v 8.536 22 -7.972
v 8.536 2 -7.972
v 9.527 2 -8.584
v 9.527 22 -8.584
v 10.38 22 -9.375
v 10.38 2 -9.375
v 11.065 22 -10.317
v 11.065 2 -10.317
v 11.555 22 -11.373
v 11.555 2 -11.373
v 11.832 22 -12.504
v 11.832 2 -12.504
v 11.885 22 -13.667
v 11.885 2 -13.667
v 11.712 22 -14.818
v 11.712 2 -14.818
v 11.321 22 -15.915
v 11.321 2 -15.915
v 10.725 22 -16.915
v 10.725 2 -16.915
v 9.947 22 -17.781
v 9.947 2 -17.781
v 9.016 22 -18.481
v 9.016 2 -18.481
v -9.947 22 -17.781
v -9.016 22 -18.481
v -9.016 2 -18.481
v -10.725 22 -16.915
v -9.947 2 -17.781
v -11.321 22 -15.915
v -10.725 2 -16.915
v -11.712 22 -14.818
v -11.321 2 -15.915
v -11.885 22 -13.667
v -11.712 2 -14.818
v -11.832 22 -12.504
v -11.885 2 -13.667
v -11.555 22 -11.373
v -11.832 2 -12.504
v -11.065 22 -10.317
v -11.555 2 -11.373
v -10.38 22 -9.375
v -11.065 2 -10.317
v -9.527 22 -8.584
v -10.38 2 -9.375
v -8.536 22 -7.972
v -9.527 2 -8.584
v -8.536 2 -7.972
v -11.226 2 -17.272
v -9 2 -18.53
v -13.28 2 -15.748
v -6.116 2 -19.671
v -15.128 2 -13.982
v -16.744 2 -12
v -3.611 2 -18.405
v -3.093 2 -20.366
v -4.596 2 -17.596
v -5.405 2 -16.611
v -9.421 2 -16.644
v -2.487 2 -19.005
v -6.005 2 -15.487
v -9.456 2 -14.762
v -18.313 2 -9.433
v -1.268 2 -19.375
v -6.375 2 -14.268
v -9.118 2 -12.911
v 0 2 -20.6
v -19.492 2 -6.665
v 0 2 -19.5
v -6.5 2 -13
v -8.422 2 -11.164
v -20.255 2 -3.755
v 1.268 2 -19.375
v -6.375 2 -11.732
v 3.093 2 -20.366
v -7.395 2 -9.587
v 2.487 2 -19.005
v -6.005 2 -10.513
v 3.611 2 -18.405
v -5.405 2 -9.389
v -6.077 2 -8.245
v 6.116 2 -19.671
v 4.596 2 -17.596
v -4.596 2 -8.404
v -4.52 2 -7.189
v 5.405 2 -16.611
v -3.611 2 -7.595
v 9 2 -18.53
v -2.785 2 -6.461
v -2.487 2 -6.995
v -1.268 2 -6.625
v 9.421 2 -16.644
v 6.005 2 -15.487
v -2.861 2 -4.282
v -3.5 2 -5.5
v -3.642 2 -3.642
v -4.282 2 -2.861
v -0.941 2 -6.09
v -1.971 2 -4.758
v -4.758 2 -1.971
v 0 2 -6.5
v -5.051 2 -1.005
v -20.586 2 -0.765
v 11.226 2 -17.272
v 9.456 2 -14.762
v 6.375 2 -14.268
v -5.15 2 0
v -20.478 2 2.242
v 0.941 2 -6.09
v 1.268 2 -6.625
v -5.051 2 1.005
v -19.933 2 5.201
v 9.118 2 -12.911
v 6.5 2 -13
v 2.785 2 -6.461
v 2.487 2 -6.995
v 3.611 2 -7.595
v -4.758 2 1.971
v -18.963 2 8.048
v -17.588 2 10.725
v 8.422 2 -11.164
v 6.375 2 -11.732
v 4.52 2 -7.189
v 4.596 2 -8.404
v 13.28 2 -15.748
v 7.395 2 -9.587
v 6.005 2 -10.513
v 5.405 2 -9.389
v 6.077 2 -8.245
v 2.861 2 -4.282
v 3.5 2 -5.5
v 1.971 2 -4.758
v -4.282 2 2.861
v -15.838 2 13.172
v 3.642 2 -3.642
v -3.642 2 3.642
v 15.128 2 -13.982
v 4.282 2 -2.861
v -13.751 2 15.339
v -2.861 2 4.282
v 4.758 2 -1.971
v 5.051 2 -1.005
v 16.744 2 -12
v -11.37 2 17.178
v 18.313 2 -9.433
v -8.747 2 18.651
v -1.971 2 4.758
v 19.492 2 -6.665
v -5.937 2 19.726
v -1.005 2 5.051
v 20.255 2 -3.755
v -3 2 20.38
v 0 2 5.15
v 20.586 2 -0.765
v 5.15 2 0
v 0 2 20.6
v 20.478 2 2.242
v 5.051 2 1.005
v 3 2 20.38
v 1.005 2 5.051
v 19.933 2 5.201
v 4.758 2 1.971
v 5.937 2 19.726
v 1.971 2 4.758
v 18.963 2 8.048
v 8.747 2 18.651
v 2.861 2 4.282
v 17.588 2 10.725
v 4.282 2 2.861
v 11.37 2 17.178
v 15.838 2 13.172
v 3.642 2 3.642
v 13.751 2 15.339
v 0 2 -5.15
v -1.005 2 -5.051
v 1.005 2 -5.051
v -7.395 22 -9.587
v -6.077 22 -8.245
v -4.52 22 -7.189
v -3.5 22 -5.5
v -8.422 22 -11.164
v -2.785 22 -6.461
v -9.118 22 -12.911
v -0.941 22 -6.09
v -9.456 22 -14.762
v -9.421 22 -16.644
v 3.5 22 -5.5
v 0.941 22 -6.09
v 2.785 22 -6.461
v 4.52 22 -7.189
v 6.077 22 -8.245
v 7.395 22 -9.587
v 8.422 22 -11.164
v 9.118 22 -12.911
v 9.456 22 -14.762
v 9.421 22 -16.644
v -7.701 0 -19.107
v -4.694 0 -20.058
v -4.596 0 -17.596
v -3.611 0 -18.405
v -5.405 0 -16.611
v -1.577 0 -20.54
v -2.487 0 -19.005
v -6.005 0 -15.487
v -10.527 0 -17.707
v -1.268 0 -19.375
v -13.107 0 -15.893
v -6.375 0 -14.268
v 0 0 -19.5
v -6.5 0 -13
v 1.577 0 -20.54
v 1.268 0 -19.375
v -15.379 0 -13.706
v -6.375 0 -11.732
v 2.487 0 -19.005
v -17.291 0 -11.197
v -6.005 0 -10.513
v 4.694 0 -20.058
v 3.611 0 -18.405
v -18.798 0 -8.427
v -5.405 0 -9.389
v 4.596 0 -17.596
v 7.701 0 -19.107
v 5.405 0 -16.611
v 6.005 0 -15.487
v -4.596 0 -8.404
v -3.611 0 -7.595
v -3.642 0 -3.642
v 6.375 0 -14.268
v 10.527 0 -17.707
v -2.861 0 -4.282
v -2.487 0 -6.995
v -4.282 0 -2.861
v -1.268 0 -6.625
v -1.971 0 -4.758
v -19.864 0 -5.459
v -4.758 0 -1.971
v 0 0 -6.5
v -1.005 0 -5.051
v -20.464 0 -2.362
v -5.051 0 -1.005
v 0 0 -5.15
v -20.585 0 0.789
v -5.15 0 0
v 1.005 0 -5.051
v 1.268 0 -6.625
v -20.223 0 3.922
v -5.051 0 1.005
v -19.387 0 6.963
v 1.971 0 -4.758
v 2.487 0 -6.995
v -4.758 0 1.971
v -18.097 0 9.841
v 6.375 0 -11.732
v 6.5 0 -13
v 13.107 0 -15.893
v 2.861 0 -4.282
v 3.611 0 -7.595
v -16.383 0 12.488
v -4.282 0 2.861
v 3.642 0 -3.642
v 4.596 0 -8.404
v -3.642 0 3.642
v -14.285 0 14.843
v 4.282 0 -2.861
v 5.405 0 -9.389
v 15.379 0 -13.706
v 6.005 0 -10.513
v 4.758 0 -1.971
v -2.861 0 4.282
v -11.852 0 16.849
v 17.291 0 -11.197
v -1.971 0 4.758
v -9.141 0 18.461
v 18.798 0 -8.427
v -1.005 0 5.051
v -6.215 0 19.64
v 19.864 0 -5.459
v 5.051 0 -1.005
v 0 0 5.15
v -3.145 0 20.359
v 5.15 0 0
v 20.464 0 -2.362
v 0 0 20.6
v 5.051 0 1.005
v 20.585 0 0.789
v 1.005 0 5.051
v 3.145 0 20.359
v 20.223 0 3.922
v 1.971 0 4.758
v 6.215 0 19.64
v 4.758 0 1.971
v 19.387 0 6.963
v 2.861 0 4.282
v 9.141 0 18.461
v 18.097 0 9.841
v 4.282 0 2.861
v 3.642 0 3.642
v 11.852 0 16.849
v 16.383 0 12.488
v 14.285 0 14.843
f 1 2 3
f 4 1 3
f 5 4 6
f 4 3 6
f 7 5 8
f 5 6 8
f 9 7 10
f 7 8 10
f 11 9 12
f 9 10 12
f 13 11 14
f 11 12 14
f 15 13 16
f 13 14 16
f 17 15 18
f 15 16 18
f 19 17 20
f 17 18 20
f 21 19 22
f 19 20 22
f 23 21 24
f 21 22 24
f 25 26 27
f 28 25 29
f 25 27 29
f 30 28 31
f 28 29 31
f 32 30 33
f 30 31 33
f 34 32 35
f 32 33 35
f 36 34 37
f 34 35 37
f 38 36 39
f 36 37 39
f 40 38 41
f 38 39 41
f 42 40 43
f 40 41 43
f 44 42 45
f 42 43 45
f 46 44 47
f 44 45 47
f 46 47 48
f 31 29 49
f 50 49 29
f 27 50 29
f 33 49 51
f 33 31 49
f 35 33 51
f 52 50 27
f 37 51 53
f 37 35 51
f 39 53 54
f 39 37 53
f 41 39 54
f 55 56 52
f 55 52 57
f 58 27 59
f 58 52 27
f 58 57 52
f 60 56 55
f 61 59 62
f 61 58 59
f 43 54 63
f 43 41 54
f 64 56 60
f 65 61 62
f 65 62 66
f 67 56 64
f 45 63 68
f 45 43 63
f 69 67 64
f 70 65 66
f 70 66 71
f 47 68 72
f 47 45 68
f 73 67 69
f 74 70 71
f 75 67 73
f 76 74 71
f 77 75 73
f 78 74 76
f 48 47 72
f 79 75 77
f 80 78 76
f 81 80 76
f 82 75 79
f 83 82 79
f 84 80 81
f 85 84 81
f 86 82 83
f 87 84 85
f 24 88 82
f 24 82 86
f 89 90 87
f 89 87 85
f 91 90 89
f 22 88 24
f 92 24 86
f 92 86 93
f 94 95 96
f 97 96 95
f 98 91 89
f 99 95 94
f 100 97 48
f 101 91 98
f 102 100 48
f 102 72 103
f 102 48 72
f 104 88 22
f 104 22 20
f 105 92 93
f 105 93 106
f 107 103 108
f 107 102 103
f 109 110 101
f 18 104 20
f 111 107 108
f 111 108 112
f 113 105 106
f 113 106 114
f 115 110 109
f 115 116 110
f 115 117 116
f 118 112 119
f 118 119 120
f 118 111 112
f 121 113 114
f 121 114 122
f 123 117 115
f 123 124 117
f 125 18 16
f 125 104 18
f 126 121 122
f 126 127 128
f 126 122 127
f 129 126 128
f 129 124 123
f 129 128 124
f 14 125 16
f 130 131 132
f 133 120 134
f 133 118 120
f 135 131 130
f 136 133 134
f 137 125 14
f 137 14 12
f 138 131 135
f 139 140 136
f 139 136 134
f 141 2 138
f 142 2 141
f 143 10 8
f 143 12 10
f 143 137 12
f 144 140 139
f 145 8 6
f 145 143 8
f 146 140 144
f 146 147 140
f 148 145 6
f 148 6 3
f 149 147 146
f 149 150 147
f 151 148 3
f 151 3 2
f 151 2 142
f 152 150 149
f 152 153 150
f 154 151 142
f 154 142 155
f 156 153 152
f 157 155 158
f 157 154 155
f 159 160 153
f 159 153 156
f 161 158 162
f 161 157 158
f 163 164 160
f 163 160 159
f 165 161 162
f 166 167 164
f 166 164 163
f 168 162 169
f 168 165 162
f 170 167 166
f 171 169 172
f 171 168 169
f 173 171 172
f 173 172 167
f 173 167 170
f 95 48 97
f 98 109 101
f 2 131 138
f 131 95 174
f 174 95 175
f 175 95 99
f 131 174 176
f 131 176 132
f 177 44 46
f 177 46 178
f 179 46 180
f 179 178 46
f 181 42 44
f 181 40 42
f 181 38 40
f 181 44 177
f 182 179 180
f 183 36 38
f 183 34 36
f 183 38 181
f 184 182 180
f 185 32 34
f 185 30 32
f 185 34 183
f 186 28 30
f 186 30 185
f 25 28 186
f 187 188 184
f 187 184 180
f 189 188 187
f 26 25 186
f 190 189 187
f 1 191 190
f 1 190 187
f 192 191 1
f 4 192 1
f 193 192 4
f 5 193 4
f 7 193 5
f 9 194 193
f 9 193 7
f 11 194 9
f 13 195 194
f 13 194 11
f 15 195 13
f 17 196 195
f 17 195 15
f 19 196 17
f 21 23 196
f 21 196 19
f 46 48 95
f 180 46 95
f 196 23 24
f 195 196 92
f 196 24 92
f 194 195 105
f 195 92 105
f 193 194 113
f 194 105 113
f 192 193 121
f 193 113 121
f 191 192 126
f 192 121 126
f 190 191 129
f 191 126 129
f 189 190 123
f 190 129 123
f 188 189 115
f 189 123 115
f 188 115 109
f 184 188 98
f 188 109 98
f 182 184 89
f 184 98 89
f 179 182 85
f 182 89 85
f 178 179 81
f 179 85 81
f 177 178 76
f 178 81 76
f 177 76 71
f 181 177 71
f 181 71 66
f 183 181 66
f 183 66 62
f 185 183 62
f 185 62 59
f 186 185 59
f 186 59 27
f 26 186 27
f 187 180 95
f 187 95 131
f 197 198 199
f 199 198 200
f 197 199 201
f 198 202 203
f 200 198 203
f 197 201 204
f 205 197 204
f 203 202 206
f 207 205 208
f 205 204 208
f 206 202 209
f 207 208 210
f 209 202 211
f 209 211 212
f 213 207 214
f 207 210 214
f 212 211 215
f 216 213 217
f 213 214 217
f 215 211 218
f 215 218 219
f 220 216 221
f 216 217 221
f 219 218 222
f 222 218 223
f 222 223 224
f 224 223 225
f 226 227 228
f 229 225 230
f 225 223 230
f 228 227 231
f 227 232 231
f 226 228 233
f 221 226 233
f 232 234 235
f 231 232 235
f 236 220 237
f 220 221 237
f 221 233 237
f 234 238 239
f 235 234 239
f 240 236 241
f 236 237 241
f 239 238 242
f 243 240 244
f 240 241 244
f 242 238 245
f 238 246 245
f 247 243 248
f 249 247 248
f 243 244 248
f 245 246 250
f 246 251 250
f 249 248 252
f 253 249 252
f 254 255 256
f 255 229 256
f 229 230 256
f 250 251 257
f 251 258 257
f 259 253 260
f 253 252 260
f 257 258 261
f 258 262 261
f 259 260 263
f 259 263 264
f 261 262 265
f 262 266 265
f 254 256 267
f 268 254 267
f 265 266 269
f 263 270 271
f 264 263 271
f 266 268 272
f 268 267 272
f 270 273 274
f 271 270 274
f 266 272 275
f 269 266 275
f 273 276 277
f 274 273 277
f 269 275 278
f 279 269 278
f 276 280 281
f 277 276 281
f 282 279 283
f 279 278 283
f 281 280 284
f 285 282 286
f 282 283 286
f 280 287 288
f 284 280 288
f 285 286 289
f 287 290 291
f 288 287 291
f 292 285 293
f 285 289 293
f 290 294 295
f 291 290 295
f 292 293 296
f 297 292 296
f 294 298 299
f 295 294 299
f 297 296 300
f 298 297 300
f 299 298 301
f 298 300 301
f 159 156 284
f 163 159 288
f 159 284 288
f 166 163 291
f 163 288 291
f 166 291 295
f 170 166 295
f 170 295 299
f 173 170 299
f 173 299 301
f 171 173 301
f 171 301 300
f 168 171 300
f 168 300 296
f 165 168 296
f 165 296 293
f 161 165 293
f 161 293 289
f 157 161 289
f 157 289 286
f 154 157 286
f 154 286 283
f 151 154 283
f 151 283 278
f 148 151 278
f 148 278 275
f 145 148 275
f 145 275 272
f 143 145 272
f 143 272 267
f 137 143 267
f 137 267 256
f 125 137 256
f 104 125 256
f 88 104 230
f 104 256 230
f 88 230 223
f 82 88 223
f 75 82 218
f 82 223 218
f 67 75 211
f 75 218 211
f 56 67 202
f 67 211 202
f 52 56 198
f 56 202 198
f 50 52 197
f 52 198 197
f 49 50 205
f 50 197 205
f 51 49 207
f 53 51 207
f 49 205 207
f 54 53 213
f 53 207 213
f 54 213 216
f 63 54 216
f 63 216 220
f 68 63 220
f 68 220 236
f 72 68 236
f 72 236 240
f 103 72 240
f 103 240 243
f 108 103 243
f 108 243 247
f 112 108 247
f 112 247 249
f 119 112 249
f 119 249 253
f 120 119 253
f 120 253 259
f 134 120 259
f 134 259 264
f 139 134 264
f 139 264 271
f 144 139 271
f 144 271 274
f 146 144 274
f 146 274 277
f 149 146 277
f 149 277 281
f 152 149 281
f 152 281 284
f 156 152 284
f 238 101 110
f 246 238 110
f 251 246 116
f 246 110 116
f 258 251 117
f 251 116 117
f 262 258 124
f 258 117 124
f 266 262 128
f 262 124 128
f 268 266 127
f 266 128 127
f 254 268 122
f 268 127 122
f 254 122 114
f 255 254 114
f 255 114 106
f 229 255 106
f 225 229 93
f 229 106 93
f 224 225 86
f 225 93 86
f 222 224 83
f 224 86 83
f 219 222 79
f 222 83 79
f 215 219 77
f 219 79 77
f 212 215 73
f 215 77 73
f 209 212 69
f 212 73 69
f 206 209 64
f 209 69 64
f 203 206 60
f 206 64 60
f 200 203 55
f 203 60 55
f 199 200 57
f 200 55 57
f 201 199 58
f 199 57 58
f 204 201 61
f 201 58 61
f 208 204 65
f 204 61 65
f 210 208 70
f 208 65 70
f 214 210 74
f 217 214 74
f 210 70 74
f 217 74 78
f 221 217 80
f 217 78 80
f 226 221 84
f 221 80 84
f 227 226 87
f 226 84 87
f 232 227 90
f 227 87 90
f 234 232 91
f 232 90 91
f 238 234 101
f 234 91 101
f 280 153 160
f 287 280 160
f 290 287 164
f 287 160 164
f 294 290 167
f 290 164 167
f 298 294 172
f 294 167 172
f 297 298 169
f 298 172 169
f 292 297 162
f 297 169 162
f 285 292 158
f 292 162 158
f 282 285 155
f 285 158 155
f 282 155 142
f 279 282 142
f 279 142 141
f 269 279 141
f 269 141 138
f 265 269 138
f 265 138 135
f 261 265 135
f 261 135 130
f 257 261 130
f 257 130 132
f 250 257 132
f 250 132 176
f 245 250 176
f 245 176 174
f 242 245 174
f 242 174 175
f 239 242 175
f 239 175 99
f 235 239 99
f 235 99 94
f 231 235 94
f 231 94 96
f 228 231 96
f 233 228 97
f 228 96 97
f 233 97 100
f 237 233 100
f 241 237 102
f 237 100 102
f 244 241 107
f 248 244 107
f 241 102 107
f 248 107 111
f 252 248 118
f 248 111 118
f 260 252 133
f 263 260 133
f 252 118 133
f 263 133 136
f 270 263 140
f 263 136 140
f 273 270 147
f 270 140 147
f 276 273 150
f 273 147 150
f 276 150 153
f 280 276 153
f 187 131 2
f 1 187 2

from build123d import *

# Parameters (mm, degrees)
SKETCH1_R           = 20.6
BOSS_EXTRUDE1_DEPTH = 2
SKETCH2_R           = 5.15
CUT_EXTRUDE1_DEPTH  = 3
SKETCH3_R           = 6.5
CUT_EXTRUDE2_DEPTH  = 2
BOSS_EXTRUDE4_DEPTH = 20
FILLET2_R           = 6


with BuildPart() as part:
    # Sketch1 → Boss-Extrude1 (new body)
    with BuildSketch(Plane(origin=(0, 0, 0), x_dir=(1, 0, 0), z_dir=(0, 1, 0))):
        with Locations(Location((0, 0, 0), (0, 0, 270))):
            Circle(SKETCH1_R)
    extrude(amount=BOSS_EXTRUDE1_DEPTH)

    # Sketch2 → Cut-Extrude1 (cut)
    with BuildSketch(Plane(origin=(0, 2, 0), x_dir=(1, 0, 0), z_dir=(0, 1, 0))):
        with Locations(Location((0, 0, 0), (0, 0, 270))):
            Circle(SKETCH2_R)
    extrude(amount=-CUT_EXTRUDE1_DEPTH, mode=Mode.SUBTRACT)

    # Sketch3 → Cut-Extrude2 (cut)
    with BuildSketch(Plane(origin=(0, 2, 0), x_dir=(1, 0, 0), z_dir=(0, 1, 0))):
        with Locations(Location((0, 13, 0), (0, 0, 270))):
            Circle(SKETCH3_R)
    extrude(amount=-CUT_EXTRUDE2_DEPTH, mode=Mode.SUBTRACT)

    # Sketch4 → Boss-Extrude4 (add)
    with BuildSketch(Plane(origin=(0, 2, 0), x_dir=(1, 0, 0), z_dir=(0, 1, 0))):
        with BuildLine():
            Line((-16.743954133, 12), (-3.5, 5.5))
            Line((-3.5, 5.5), (3.5, 5.5))
            Line((3.5, 5.5), (16.743954133, 12))
            ThreePointArc((16.743954133, 12), (13.279606143, 15.748398671), (9, 18.529975715))
            ThreePointArc((9, 18.529975715), (0, 6.042759079), (-9, 18.529975715))
            ThreePointArc((-9, 18.529975715), (-13.279606143, 15.748398671), (-16.743954133, 12))
        make_face()
    extrude(amount=BOSS_EXTRUDE4_DEPTH)

    # Fillet2
    # the kernel refuses this fillet: 6 mm, written as the material it takes off along each edge
    with BuildSketch(Plane(origin=(16.743954133, 2, -12), x_dir=(-0.7761796310564387, 0, -0.6305118399626535), z_dir=(0, 1, 0))) as fillet2_piece_1:
        with BuildLine():
            CenterArc((9.278744028, 5.78779133), FILLET2_R, 155.229237023, 130.054584679)
            Line((3.830795632, 8.301724161), (0, 0))
            ThreePointArc((0, 0), (5.430174062, -0.728583099), (10.860348123, 0))
        make_face()
    extrude(amount=47.150870308, mode=Mode.SUBTRACT)
    with BuildSketch(Plane(origin=(-16.743954133, 2, -12), x_dir=(0.7761796310564387, 0, -0.6305118399626534), z_dir=(0, 1, 0))) as fillet2_piece_2:
        with BuildLine():
            CenterArc((9.278744028, -5.78779133), FILLET2_R, 74.716178298, 130.054584679)
            Line((3.830795632, -8.301724161), (0, 0))
            ThreePointArc((0, 0), (5.430174062, 0.728583099), (10.860348123, 0))
        make_face()
    extrude(amount=47.150870308, mode=Mode.SUBTRACT)


solid = part.part
